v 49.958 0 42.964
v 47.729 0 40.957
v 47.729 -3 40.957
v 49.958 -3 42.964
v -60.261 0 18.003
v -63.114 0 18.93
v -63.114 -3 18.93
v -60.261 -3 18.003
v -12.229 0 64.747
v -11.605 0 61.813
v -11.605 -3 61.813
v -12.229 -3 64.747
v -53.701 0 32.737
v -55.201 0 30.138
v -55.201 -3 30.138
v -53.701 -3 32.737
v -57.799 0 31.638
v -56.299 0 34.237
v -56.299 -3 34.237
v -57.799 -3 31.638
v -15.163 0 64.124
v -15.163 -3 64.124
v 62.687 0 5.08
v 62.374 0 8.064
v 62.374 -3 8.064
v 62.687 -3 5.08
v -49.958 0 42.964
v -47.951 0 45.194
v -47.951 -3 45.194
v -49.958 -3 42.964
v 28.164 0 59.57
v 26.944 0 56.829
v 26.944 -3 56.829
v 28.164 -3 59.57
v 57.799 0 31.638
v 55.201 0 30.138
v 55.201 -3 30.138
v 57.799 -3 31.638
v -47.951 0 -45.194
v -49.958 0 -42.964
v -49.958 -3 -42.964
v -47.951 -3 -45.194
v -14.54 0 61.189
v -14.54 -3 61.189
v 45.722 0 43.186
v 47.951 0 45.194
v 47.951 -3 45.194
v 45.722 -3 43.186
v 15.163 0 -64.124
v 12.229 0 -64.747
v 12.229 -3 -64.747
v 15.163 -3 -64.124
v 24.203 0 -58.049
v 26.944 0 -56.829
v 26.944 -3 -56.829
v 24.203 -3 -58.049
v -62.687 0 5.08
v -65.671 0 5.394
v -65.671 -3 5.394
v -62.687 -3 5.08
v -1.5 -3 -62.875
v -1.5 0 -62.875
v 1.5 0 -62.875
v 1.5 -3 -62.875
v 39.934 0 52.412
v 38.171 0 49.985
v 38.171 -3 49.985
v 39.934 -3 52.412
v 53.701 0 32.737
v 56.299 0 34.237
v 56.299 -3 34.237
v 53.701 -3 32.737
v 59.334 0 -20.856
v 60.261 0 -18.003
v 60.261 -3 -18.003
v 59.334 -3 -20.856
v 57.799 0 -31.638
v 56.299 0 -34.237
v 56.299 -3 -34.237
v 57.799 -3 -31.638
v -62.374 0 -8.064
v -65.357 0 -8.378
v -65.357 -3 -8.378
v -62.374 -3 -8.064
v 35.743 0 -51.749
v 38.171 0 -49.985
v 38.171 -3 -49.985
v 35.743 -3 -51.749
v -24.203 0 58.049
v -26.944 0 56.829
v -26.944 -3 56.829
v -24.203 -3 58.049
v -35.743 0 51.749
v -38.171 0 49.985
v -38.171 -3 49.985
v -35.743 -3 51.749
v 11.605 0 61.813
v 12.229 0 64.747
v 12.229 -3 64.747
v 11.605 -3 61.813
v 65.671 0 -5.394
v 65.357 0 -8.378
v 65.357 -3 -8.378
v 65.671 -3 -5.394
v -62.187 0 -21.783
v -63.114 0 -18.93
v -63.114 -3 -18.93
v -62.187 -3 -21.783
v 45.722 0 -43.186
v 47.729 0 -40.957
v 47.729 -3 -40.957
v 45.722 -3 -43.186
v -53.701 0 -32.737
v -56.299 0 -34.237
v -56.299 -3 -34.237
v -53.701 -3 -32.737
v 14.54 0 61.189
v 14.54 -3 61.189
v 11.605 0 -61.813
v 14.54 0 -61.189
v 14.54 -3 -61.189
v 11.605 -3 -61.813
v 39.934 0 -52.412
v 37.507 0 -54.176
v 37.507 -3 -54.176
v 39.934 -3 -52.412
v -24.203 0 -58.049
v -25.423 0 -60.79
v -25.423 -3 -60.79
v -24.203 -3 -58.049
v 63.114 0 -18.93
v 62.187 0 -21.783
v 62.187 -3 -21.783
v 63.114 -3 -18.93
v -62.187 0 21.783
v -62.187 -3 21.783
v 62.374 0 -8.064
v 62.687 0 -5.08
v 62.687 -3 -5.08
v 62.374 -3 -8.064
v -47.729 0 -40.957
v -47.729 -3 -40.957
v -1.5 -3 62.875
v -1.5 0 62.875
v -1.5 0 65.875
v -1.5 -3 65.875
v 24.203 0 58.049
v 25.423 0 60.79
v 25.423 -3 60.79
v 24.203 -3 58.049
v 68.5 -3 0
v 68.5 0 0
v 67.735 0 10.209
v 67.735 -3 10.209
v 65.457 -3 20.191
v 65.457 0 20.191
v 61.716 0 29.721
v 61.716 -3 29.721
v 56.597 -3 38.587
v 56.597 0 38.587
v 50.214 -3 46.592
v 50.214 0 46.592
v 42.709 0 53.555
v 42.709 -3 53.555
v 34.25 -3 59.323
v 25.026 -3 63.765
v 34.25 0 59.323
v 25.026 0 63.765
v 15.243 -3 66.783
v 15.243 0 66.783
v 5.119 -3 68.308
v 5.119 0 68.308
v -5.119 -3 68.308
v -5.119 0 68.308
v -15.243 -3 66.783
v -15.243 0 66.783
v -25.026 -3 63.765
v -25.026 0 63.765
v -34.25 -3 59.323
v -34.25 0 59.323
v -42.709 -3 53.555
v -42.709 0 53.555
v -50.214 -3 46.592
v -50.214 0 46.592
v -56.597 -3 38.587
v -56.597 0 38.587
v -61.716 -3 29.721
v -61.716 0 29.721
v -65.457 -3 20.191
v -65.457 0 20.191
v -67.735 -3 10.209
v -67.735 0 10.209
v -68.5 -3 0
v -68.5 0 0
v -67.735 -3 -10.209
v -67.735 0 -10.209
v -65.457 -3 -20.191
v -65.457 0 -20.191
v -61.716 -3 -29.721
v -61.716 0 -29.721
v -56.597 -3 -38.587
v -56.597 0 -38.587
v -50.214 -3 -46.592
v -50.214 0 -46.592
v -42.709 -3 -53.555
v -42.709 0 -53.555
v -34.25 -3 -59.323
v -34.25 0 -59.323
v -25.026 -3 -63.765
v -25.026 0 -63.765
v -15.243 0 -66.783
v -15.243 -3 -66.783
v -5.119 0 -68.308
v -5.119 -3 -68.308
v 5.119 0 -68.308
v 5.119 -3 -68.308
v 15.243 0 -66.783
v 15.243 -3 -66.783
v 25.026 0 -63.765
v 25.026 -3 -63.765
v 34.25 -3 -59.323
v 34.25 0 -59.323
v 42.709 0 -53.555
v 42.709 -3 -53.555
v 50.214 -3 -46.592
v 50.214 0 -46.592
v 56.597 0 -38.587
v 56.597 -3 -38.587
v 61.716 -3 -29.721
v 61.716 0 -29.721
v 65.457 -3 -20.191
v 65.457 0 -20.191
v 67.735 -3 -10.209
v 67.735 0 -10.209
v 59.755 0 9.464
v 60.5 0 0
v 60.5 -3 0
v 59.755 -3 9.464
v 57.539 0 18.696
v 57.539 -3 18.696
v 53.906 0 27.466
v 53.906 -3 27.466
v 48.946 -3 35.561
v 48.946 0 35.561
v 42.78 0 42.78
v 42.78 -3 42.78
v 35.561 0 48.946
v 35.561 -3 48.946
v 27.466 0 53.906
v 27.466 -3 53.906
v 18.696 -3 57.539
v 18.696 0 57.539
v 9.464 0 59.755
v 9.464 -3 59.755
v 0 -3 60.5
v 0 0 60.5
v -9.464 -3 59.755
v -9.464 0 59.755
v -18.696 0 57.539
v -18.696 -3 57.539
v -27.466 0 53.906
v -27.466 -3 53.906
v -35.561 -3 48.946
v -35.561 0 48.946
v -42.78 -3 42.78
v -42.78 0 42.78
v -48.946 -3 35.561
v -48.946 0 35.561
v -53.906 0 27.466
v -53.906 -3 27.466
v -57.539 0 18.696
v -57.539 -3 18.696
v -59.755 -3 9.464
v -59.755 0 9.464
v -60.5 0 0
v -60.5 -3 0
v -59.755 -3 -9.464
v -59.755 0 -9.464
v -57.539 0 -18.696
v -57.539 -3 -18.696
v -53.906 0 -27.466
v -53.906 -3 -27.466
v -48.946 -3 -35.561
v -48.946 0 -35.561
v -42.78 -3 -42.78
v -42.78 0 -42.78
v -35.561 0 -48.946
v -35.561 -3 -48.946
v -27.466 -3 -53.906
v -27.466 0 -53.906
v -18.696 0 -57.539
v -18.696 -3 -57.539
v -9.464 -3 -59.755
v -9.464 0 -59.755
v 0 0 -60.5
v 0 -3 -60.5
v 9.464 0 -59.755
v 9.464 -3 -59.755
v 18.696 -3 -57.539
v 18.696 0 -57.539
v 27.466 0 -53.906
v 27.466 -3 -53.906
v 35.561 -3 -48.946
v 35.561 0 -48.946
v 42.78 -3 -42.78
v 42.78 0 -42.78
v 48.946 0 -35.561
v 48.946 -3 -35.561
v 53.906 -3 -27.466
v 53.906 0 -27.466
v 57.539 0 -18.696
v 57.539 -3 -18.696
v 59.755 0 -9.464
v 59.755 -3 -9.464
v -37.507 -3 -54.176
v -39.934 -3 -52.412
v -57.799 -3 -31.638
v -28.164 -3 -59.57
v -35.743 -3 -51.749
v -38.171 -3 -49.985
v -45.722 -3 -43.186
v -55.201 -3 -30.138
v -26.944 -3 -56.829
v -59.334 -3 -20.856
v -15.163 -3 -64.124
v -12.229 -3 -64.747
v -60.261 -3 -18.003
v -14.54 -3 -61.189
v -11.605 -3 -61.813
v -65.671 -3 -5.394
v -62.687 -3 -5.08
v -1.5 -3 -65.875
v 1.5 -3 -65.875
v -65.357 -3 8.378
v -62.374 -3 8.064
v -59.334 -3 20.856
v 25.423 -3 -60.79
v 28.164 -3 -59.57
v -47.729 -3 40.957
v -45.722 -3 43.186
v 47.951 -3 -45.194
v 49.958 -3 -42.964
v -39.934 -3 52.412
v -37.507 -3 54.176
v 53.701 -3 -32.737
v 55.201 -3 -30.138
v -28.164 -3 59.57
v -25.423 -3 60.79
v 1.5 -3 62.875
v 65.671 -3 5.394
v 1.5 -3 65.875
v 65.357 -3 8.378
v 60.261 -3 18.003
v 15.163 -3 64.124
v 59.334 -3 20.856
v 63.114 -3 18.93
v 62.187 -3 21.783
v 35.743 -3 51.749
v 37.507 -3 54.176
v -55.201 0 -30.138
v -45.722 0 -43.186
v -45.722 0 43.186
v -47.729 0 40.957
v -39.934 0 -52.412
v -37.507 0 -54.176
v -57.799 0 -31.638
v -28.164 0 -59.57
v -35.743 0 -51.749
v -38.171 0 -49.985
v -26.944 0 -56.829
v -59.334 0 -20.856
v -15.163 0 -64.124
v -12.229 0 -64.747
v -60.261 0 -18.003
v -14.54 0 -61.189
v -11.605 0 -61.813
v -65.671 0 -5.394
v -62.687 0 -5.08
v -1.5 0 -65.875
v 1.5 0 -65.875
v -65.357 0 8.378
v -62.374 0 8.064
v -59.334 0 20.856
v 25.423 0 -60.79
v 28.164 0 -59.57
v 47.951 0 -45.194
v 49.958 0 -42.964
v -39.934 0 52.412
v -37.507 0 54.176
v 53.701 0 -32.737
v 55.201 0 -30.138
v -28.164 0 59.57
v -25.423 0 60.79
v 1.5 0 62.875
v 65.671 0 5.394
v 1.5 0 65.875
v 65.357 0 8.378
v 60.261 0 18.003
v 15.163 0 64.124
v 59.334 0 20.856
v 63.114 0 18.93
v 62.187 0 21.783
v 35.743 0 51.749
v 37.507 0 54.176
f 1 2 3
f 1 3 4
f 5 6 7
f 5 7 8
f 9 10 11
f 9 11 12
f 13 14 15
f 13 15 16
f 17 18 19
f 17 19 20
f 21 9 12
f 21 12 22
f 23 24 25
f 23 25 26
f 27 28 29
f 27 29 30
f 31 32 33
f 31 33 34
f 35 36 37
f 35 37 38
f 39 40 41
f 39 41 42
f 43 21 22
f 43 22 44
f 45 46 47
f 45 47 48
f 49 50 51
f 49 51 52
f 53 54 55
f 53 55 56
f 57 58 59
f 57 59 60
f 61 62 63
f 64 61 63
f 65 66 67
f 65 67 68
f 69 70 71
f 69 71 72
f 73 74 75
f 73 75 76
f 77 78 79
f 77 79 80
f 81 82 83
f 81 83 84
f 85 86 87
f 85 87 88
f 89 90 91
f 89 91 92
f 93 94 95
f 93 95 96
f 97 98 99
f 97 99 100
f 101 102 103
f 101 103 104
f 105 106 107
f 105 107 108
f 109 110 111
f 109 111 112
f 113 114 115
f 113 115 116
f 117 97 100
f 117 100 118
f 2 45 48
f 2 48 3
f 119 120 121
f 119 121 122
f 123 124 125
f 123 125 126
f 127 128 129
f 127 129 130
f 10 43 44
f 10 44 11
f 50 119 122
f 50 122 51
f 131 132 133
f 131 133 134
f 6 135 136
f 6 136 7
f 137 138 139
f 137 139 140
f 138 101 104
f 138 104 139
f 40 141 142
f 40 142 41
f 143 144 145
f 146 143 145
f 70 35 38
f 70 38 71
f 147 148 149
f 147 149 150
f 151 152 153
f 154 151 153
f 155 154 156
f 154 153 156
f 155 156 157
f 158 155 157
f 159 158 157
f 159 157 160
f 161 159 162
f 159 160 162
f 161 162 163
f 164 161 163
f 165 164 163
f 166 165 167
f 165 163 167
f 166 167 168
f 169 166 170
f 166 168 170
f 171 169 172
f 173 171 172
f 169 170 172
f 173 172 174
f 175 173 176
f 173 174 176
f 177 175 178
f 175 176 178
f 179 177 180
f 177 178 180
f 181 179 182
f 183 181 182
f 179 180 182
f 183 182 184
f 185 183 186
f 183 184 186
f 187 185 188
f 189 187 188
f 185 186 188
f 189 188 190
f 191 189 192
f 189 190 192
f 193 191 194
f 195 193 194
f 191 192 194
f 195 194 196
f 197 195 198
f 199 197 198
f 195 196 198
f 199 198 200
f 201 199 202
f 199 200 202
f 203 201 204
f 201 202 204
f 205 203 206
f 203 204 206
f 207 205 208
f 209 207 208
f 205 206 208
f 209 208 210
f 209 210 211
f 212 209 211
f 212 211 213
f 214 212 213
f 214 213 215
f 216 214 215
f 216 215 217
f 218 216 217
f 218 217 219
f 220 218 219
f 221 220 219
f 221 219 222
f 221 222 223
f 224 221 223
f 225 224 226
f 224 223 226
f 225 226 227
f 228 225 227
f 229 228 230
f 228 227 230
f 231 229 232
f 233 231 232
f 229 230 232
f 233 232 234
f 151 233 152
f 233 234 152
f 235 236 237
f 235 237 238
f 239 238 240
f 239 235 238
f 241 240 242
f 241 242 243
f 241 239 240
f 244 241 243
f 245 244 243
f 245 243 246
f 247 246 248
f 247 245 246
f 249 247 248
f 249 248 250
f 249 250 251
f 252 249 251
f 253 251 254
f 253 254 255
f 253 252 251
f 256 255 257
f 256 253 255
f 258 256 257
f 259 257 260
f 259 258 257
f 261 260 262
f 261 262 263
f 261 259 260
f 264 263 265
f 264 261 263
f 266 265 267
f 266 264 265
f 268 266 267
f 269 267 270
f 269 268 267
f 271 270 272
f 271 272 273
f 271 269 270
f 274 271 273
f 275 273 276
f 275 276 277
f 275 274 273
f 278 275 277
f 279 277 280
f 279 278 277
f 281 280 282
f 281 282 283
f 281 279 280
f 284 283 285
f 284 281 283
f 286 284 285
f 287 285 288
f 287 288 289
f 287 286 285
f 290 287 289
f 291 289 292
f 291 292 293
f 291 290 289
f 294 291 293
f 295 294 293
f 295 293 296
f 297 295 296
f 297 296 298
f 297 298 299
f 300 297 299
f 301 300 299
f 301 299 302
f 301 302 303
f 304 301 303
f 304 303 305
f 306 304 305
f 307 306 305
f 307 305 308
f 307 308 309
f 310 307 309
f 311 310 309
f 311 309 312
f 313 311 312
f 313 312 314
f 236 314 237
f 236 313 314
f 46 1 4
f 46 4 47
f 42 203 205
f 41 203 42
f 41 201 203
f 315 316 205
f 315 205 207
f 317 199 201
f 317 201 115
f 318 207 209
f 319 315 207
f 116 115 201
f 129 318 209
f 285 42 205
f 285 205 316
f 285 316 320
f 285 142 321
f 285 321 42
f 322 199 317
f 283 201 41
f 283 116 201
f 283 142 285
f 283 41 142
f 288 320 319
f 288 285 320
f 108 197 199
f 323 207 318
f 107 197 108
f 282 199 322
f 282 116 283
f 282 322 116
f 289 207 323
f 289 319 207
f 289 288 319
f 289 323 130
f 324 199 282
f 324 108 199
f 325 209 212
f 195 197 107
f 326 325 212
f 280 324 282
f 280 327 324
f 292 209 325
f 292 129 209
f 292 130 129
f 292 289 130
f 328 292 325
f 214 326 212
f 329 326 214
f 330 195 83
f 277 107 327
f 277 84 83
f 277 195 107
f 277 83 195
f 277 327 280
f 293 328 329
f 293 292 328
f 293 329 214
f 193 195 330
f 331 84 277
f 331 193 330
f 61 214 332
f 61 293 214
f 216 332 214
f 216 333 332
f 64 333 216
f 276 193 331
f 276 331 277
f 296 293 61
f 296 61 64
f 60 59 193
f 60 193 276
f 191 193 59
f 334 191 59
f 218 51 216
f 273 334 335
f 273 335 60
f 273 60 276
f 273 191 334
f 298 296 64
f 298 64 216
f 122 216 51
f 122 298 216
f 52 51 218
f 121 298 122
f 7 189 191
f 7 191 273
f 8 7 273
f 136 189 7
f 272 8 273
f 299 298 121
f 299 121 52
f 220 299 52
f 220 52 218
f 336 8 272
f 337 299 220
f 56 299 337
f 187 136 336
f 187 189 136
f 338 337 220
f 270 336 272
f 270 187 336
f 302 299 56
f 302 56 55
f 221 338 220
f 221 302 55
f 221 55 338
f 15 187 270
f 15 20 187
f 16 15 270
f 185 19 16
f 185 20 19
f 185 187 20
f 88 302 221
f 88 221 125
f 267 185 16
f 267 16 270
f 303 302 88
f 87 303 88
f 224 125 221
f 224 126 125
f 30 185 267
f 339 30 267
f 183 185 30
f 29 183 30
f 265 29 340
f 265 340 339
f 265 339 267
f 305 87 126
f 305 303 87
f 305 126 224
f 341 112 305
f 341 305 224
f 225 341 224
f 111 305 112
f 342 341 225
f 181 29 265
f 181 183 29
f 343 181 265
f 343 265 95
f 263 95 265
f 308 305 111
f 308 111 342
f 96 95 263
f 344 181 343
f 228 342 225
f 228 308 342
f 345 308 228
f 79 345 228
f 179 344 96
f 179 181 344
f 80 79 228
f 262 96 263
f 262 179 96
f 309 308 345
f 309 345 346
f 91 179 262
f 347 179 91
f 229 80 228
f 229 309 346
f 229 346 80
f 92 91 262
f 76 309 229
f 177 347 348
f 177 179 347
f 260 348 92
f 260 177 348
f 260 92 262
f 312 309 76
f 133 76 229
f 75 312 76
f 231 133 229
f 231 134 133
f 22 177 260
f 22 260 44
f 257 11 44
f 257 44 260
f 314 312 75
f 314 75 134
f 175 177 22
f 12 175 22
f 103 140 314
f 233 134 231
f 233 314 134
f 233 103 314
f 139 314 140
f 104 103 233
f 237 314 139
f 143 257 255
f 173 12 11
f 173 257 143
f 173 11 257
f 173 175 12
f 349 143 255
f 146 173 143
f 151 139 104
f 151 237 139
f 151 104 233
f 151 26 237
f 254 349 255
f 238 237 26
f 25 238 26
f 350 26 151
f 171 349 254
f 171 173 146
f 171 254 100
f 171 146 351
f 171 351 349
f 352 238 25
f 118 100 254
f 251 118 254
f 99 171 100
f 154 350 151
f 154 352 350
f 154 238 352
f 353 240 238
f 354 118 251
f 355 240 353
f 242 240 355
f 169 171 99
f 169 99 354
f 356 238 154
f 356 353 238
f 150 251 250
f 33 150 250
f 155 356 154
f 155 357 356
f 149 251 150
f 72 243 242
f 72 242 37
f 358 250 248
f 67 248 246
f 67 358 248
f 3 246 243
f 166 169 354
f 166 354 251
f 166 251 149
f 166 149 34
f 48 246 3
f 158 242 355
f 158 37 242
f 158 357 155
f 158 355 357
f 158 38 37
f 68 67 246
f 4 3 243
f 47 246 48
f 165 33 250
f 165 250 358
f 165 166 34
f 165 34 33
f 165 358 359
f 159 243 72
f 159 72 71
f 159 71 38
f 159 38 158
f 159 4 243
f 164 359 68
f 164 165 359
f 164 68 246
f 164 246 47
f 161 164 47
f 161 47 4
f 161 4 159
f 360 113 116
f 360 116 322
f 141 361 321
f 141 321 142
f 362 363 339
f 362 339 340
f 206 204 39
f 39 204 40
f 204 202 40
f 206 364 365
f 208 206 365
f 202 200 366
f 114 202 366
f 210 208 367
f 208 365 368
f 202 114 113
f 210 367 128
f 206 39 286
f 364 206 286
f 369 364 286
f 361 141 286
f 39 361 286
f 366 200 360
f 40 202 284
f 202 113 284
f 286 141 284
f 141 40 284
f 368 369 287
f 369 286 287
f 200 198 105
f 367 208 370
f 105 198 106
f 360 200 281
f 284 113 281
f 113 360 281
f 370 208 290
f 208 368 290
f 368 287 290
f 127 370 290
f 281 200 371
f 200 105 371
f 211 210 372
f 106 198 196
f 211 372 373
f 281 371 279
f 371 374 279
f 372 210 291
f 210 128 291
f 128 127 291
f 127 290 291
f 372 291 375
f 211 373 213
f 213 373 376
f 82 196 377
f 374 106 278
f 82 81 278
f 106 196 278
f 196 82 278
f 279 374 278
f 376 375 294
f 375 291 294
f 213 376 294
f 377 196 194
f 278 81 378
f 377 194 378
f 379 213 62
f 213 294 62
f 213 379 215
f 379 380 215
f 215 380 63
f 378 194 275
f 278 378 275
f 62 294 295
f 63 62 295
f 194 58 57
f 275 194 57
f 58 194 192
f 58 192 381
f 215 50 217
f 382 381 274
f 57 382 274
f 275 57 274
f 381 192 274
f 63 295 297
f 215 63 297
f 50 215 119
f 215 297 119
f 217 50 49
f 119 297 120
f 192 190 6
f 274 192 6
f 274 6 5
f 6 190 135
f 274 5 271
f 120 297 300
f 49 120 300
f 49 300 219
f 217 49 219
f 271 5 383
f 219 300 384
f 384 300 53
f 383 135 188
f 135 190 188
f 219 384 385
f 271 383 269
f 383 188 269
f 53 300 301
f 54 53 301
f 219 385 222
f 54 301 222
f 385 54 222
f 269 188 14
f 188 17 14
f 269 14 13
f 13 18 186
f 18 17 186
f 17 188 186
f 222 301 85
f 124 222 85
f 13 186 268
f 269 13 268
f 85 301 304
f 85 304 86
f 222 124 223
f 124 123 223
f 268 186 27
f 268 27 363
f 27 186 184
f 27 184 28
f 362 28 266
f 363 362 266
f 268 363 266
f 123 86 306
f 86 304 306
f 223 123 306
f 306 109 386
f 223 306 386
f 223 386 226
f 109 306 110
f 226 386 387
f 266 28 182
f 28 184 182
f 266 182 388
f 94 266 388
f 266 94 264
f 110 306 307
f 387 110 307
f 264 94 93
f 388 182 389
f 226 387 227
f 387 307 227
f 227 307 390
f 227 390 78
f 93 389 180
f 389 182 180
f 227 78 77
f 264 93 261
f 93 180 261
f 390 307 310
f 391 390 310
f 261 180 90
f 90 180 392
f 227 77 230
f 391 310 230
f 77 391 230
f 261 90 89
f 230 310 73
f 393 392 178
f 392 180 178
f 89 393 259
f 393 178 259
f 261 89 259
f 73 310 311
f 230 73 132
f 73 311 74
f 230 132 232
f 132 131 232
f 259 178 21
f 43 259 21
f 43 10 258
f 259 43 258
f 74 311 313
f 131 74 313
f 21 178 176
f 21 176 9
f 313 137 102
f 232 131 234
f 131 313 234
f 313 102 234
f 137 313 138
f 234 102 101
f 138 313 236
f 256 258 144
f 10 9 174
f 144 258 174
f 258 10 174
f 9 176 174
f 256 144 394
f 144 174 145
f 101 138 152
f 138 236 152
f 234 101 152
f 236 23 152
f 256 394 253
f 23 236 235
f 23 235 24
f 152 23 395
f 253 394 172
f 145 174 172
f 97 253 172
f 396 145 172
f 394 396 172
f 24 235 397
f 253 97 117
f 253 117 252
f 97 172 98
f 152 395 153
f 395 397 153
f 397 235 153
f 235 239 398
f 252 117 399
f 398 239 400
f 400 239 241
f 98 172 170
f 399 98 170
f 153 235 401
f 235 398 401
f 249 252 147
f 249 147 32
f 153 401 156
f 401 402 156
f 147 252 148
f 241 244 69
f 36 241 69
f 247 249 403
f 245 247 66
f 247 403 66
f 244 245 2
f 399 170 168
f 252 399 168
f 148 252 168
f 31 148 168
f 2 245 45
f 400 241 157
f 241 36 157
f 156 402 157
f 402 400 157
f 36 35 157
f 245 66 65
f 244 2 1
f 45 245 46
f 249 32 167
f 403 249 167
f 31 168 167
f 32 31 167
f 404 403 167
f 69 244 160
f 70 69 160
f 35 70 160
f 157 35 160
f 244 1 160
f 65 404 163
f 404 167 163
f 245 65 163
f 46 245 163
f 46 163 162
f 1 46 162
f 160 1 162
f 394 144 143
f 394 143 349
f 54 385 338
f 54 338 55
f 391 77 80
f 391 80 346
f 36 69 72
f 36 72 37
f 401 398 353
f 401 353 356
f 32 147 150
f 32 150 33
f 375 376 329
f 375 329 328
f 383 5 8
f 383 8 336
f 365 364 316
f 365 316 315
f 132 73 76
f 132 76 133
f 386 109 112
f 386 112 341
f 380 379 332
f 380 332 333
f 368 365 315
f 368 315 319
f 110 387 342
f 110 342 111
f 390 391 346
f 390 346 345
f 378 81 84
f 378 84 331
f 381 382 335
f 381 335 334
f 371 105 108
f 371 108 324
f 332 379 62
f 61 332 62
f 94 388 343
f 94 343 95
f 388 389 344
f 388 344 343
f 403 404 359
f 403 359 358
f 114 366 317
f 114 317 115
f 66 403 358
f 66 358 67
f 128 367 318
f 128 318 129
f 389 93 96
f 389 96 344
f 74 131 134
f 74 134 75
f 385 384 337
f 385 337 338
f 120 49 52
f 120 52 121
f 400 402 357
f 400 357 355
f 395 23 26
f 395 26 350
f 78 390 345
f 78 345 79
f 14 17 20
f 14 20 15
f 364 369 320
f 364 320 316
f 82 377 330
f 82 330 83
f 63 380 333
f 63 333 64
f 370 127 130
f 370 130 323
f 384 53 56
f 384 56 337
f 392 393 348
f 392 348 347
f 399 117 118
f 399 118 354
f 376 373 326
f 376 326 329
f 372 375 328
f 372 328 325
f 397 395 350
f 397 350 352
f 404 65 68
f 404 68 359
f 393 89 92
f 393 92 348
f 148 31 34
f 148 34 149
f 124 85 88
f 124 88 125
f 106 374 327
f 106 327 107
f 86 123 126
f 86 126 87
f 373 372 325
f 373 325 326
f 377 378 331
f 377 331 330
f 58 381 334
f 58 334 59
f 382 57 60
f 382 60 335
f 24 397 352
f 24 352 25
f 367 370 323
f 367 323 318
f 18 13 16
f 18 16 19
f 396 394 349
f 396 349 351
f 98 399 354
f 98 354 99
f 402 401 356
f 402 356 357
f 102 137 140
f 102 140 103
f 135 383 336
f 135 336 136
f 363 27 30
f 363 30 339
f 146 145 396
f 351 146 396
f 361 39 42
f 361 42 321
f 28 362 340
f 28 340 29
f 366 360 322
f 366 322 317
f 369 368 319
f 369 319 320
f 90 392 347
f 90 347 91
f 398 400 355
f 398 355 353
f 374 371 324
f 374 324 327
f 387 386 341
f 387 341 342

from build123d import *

# Parameters (mm, degrees)
F0_R     = 68.5
F0_R_2   = 60.5
F1_DEPTH = 3
F2_W     = 3
F2_H     = 3
F3_DEPTH = 3


with BuildPart() as f1:
    # F0 (on Front) → F1 (new body)
    with BuildSketch(Plane.XZ):
        Circle(F0_R)
        Circle(F0_R_2, mode=Mode.SUBTRACT)
    extrude(amount=F1_DEPTH)

    # F2 (on Front) → F3 (cut)
    with BuildSketch(Plane.XZ):
        with Locations((0, 64.375)):
            Rectangle(F2_W, F2_H)
        Polygon((-12.228961, 64.747341), (-15.163404, 64.123606), (-14.539669, 61.189163), (-11.605226, 61.812898), align=None)
        Polygon((-25.423458, 60.789912), (-28.164095, 59.569702), (-26.943885, 56.829066), (-24.203248, 58.049276), align=None)
        Polygon((-35.743472, 51.748621), (-37.506828, 54.175672), (-39.933879, 52.412317), (-38.170523, 49.985266), align=None)
        Polygon((-45.721535, 43.186304), (-47.950969, 45.193696), (-49.958361, 42.964261), (-47.728927, 40.95687), align=None)
        Polygon((-53.701347, 32.736538), (-56.299423, 34.236538), (-57.799423, 31.638462), (-55.201347, 30.138462), align=None)
        Polygon((-59.334153, 20.856028), (-62.187323, 21.783079), (-63.114374, 18.92991), (-60.261204, 18.002859), align=None)
        Polygon((-62.373771, 8.06401), (-65.357337, 8.377595), (-65.670923, 5.39403), (-62.687357, 5.080444), align=None)
        Polygon((-62.687357, -5.080444), (-65.670923, -5.39403), (-65.357337, -8.377595), (-62.373771, -8.06401), align=None)
        Polygon((-60.261204, -18.002859), (-63.114374, -18.92991), (-62.187323, -21.783079), (-59.334153, -20.856028), align=None)
        Polygon((-55.201347, -30.138462), (-57.799423, -31.638462), (-56.299423, -34.236538), (-53.701347, -32.736538), align=None)
        Polygon((-47.728927, -40.95687), (-49.958361, -42.964261), (-47.950969, -45.193696), (-45.721535, -43.186304), align=None)
        Polygon((-38.170523, -49.985266), (-39.933879, -52.412317), (-37.506828, -54.175672), (-35.743472, -51.748621), align=None)
        Polygon((-26.943885, -56.829066), (-28.164095, -59.569702), (-25.423458, -60.789912), (-24.203248, -58.049276), align=None)
        Polygon((-14.539669, -61.189163), (-15.163404, -64.123606), (-12.228961, -64.747341), (-11.605226, -61.812898), align=None)
        with Locations((0, -64.375)):
            Rectangle(F2_W, F2_H)
        Polygon((11.605226, -61.812898), (12.228961, -64.747341), (15.163404, -64.123606), (14.539669, -61.189163), align=None)
        Polygon((24.203248, -58.049276), (25.423458, -60.789912), (28.164095, -59.569702), (26.943885, -56.829066), align=None)
        Polygon((35.743472, -51.748621), (37.506828, -54.175672), (39.933879, -52.412317), (38.170523, -49.985266), align=None)
        Polygon((45.721535, -43.186304), (47.950969, -45.193696), (49.958361, -42.964261), (47.728927, -40.95687), align=None)
        Polygon((53.701347, -32.736538), (56.299423, -34.236538), (57.799423, -31.638462), (55.201347, -30.138462), align=None)
        Polygon((59.334153, -20.856028), (62.187323, -21.783079), (63.114374, -18.92991), (60.261204, -18.002859), align=None)
        Polygon((62.373771, -8.06401), (65.357337, -8.377595), (65.670923, -5.39403), (62.687357, -5.080444), align=None)
        Polygon((62.687357, 5.080444), (65.670923, 5.39403), (65.357337, 8.377595), (62.373771, 8.06401), align=None)
        Polygon((60.261204, 18.002859), (63.114374, 18.92991), (62.187323, 21.783079), (59.334153, 20.856028), align=None)
        Polygon((55.201347, 30.138462), (57.799423, 31.638462), (56.299423, 34.236538), (53.701347, 32.736538), align=None)
        Polygon((47.728927, 40.95687), (49.958361, 42.964261), (47.950969, 45.193696), (45.721535, 43.186304), align=None)
        Polygon((38.170523, 49.985266), (39.933879, 52.412317), (37.506828, 54.175672), (35.743472, 51.748621), align=None)
        Polygon((26.943885, 56.829066), (28.164095, 59.569702), (25.423458, 60.789912), (24.203248, 58.049276), align=None)
        Polygon((14.539669, 61.189163), (15.163404, 64.123606), (12.228961, 64.747341), (11.605226, 61.812898), align=None)
    extrude(amount=F3_DEPTH, mode=Mode.SUBTRACT)


solid = f1.part
